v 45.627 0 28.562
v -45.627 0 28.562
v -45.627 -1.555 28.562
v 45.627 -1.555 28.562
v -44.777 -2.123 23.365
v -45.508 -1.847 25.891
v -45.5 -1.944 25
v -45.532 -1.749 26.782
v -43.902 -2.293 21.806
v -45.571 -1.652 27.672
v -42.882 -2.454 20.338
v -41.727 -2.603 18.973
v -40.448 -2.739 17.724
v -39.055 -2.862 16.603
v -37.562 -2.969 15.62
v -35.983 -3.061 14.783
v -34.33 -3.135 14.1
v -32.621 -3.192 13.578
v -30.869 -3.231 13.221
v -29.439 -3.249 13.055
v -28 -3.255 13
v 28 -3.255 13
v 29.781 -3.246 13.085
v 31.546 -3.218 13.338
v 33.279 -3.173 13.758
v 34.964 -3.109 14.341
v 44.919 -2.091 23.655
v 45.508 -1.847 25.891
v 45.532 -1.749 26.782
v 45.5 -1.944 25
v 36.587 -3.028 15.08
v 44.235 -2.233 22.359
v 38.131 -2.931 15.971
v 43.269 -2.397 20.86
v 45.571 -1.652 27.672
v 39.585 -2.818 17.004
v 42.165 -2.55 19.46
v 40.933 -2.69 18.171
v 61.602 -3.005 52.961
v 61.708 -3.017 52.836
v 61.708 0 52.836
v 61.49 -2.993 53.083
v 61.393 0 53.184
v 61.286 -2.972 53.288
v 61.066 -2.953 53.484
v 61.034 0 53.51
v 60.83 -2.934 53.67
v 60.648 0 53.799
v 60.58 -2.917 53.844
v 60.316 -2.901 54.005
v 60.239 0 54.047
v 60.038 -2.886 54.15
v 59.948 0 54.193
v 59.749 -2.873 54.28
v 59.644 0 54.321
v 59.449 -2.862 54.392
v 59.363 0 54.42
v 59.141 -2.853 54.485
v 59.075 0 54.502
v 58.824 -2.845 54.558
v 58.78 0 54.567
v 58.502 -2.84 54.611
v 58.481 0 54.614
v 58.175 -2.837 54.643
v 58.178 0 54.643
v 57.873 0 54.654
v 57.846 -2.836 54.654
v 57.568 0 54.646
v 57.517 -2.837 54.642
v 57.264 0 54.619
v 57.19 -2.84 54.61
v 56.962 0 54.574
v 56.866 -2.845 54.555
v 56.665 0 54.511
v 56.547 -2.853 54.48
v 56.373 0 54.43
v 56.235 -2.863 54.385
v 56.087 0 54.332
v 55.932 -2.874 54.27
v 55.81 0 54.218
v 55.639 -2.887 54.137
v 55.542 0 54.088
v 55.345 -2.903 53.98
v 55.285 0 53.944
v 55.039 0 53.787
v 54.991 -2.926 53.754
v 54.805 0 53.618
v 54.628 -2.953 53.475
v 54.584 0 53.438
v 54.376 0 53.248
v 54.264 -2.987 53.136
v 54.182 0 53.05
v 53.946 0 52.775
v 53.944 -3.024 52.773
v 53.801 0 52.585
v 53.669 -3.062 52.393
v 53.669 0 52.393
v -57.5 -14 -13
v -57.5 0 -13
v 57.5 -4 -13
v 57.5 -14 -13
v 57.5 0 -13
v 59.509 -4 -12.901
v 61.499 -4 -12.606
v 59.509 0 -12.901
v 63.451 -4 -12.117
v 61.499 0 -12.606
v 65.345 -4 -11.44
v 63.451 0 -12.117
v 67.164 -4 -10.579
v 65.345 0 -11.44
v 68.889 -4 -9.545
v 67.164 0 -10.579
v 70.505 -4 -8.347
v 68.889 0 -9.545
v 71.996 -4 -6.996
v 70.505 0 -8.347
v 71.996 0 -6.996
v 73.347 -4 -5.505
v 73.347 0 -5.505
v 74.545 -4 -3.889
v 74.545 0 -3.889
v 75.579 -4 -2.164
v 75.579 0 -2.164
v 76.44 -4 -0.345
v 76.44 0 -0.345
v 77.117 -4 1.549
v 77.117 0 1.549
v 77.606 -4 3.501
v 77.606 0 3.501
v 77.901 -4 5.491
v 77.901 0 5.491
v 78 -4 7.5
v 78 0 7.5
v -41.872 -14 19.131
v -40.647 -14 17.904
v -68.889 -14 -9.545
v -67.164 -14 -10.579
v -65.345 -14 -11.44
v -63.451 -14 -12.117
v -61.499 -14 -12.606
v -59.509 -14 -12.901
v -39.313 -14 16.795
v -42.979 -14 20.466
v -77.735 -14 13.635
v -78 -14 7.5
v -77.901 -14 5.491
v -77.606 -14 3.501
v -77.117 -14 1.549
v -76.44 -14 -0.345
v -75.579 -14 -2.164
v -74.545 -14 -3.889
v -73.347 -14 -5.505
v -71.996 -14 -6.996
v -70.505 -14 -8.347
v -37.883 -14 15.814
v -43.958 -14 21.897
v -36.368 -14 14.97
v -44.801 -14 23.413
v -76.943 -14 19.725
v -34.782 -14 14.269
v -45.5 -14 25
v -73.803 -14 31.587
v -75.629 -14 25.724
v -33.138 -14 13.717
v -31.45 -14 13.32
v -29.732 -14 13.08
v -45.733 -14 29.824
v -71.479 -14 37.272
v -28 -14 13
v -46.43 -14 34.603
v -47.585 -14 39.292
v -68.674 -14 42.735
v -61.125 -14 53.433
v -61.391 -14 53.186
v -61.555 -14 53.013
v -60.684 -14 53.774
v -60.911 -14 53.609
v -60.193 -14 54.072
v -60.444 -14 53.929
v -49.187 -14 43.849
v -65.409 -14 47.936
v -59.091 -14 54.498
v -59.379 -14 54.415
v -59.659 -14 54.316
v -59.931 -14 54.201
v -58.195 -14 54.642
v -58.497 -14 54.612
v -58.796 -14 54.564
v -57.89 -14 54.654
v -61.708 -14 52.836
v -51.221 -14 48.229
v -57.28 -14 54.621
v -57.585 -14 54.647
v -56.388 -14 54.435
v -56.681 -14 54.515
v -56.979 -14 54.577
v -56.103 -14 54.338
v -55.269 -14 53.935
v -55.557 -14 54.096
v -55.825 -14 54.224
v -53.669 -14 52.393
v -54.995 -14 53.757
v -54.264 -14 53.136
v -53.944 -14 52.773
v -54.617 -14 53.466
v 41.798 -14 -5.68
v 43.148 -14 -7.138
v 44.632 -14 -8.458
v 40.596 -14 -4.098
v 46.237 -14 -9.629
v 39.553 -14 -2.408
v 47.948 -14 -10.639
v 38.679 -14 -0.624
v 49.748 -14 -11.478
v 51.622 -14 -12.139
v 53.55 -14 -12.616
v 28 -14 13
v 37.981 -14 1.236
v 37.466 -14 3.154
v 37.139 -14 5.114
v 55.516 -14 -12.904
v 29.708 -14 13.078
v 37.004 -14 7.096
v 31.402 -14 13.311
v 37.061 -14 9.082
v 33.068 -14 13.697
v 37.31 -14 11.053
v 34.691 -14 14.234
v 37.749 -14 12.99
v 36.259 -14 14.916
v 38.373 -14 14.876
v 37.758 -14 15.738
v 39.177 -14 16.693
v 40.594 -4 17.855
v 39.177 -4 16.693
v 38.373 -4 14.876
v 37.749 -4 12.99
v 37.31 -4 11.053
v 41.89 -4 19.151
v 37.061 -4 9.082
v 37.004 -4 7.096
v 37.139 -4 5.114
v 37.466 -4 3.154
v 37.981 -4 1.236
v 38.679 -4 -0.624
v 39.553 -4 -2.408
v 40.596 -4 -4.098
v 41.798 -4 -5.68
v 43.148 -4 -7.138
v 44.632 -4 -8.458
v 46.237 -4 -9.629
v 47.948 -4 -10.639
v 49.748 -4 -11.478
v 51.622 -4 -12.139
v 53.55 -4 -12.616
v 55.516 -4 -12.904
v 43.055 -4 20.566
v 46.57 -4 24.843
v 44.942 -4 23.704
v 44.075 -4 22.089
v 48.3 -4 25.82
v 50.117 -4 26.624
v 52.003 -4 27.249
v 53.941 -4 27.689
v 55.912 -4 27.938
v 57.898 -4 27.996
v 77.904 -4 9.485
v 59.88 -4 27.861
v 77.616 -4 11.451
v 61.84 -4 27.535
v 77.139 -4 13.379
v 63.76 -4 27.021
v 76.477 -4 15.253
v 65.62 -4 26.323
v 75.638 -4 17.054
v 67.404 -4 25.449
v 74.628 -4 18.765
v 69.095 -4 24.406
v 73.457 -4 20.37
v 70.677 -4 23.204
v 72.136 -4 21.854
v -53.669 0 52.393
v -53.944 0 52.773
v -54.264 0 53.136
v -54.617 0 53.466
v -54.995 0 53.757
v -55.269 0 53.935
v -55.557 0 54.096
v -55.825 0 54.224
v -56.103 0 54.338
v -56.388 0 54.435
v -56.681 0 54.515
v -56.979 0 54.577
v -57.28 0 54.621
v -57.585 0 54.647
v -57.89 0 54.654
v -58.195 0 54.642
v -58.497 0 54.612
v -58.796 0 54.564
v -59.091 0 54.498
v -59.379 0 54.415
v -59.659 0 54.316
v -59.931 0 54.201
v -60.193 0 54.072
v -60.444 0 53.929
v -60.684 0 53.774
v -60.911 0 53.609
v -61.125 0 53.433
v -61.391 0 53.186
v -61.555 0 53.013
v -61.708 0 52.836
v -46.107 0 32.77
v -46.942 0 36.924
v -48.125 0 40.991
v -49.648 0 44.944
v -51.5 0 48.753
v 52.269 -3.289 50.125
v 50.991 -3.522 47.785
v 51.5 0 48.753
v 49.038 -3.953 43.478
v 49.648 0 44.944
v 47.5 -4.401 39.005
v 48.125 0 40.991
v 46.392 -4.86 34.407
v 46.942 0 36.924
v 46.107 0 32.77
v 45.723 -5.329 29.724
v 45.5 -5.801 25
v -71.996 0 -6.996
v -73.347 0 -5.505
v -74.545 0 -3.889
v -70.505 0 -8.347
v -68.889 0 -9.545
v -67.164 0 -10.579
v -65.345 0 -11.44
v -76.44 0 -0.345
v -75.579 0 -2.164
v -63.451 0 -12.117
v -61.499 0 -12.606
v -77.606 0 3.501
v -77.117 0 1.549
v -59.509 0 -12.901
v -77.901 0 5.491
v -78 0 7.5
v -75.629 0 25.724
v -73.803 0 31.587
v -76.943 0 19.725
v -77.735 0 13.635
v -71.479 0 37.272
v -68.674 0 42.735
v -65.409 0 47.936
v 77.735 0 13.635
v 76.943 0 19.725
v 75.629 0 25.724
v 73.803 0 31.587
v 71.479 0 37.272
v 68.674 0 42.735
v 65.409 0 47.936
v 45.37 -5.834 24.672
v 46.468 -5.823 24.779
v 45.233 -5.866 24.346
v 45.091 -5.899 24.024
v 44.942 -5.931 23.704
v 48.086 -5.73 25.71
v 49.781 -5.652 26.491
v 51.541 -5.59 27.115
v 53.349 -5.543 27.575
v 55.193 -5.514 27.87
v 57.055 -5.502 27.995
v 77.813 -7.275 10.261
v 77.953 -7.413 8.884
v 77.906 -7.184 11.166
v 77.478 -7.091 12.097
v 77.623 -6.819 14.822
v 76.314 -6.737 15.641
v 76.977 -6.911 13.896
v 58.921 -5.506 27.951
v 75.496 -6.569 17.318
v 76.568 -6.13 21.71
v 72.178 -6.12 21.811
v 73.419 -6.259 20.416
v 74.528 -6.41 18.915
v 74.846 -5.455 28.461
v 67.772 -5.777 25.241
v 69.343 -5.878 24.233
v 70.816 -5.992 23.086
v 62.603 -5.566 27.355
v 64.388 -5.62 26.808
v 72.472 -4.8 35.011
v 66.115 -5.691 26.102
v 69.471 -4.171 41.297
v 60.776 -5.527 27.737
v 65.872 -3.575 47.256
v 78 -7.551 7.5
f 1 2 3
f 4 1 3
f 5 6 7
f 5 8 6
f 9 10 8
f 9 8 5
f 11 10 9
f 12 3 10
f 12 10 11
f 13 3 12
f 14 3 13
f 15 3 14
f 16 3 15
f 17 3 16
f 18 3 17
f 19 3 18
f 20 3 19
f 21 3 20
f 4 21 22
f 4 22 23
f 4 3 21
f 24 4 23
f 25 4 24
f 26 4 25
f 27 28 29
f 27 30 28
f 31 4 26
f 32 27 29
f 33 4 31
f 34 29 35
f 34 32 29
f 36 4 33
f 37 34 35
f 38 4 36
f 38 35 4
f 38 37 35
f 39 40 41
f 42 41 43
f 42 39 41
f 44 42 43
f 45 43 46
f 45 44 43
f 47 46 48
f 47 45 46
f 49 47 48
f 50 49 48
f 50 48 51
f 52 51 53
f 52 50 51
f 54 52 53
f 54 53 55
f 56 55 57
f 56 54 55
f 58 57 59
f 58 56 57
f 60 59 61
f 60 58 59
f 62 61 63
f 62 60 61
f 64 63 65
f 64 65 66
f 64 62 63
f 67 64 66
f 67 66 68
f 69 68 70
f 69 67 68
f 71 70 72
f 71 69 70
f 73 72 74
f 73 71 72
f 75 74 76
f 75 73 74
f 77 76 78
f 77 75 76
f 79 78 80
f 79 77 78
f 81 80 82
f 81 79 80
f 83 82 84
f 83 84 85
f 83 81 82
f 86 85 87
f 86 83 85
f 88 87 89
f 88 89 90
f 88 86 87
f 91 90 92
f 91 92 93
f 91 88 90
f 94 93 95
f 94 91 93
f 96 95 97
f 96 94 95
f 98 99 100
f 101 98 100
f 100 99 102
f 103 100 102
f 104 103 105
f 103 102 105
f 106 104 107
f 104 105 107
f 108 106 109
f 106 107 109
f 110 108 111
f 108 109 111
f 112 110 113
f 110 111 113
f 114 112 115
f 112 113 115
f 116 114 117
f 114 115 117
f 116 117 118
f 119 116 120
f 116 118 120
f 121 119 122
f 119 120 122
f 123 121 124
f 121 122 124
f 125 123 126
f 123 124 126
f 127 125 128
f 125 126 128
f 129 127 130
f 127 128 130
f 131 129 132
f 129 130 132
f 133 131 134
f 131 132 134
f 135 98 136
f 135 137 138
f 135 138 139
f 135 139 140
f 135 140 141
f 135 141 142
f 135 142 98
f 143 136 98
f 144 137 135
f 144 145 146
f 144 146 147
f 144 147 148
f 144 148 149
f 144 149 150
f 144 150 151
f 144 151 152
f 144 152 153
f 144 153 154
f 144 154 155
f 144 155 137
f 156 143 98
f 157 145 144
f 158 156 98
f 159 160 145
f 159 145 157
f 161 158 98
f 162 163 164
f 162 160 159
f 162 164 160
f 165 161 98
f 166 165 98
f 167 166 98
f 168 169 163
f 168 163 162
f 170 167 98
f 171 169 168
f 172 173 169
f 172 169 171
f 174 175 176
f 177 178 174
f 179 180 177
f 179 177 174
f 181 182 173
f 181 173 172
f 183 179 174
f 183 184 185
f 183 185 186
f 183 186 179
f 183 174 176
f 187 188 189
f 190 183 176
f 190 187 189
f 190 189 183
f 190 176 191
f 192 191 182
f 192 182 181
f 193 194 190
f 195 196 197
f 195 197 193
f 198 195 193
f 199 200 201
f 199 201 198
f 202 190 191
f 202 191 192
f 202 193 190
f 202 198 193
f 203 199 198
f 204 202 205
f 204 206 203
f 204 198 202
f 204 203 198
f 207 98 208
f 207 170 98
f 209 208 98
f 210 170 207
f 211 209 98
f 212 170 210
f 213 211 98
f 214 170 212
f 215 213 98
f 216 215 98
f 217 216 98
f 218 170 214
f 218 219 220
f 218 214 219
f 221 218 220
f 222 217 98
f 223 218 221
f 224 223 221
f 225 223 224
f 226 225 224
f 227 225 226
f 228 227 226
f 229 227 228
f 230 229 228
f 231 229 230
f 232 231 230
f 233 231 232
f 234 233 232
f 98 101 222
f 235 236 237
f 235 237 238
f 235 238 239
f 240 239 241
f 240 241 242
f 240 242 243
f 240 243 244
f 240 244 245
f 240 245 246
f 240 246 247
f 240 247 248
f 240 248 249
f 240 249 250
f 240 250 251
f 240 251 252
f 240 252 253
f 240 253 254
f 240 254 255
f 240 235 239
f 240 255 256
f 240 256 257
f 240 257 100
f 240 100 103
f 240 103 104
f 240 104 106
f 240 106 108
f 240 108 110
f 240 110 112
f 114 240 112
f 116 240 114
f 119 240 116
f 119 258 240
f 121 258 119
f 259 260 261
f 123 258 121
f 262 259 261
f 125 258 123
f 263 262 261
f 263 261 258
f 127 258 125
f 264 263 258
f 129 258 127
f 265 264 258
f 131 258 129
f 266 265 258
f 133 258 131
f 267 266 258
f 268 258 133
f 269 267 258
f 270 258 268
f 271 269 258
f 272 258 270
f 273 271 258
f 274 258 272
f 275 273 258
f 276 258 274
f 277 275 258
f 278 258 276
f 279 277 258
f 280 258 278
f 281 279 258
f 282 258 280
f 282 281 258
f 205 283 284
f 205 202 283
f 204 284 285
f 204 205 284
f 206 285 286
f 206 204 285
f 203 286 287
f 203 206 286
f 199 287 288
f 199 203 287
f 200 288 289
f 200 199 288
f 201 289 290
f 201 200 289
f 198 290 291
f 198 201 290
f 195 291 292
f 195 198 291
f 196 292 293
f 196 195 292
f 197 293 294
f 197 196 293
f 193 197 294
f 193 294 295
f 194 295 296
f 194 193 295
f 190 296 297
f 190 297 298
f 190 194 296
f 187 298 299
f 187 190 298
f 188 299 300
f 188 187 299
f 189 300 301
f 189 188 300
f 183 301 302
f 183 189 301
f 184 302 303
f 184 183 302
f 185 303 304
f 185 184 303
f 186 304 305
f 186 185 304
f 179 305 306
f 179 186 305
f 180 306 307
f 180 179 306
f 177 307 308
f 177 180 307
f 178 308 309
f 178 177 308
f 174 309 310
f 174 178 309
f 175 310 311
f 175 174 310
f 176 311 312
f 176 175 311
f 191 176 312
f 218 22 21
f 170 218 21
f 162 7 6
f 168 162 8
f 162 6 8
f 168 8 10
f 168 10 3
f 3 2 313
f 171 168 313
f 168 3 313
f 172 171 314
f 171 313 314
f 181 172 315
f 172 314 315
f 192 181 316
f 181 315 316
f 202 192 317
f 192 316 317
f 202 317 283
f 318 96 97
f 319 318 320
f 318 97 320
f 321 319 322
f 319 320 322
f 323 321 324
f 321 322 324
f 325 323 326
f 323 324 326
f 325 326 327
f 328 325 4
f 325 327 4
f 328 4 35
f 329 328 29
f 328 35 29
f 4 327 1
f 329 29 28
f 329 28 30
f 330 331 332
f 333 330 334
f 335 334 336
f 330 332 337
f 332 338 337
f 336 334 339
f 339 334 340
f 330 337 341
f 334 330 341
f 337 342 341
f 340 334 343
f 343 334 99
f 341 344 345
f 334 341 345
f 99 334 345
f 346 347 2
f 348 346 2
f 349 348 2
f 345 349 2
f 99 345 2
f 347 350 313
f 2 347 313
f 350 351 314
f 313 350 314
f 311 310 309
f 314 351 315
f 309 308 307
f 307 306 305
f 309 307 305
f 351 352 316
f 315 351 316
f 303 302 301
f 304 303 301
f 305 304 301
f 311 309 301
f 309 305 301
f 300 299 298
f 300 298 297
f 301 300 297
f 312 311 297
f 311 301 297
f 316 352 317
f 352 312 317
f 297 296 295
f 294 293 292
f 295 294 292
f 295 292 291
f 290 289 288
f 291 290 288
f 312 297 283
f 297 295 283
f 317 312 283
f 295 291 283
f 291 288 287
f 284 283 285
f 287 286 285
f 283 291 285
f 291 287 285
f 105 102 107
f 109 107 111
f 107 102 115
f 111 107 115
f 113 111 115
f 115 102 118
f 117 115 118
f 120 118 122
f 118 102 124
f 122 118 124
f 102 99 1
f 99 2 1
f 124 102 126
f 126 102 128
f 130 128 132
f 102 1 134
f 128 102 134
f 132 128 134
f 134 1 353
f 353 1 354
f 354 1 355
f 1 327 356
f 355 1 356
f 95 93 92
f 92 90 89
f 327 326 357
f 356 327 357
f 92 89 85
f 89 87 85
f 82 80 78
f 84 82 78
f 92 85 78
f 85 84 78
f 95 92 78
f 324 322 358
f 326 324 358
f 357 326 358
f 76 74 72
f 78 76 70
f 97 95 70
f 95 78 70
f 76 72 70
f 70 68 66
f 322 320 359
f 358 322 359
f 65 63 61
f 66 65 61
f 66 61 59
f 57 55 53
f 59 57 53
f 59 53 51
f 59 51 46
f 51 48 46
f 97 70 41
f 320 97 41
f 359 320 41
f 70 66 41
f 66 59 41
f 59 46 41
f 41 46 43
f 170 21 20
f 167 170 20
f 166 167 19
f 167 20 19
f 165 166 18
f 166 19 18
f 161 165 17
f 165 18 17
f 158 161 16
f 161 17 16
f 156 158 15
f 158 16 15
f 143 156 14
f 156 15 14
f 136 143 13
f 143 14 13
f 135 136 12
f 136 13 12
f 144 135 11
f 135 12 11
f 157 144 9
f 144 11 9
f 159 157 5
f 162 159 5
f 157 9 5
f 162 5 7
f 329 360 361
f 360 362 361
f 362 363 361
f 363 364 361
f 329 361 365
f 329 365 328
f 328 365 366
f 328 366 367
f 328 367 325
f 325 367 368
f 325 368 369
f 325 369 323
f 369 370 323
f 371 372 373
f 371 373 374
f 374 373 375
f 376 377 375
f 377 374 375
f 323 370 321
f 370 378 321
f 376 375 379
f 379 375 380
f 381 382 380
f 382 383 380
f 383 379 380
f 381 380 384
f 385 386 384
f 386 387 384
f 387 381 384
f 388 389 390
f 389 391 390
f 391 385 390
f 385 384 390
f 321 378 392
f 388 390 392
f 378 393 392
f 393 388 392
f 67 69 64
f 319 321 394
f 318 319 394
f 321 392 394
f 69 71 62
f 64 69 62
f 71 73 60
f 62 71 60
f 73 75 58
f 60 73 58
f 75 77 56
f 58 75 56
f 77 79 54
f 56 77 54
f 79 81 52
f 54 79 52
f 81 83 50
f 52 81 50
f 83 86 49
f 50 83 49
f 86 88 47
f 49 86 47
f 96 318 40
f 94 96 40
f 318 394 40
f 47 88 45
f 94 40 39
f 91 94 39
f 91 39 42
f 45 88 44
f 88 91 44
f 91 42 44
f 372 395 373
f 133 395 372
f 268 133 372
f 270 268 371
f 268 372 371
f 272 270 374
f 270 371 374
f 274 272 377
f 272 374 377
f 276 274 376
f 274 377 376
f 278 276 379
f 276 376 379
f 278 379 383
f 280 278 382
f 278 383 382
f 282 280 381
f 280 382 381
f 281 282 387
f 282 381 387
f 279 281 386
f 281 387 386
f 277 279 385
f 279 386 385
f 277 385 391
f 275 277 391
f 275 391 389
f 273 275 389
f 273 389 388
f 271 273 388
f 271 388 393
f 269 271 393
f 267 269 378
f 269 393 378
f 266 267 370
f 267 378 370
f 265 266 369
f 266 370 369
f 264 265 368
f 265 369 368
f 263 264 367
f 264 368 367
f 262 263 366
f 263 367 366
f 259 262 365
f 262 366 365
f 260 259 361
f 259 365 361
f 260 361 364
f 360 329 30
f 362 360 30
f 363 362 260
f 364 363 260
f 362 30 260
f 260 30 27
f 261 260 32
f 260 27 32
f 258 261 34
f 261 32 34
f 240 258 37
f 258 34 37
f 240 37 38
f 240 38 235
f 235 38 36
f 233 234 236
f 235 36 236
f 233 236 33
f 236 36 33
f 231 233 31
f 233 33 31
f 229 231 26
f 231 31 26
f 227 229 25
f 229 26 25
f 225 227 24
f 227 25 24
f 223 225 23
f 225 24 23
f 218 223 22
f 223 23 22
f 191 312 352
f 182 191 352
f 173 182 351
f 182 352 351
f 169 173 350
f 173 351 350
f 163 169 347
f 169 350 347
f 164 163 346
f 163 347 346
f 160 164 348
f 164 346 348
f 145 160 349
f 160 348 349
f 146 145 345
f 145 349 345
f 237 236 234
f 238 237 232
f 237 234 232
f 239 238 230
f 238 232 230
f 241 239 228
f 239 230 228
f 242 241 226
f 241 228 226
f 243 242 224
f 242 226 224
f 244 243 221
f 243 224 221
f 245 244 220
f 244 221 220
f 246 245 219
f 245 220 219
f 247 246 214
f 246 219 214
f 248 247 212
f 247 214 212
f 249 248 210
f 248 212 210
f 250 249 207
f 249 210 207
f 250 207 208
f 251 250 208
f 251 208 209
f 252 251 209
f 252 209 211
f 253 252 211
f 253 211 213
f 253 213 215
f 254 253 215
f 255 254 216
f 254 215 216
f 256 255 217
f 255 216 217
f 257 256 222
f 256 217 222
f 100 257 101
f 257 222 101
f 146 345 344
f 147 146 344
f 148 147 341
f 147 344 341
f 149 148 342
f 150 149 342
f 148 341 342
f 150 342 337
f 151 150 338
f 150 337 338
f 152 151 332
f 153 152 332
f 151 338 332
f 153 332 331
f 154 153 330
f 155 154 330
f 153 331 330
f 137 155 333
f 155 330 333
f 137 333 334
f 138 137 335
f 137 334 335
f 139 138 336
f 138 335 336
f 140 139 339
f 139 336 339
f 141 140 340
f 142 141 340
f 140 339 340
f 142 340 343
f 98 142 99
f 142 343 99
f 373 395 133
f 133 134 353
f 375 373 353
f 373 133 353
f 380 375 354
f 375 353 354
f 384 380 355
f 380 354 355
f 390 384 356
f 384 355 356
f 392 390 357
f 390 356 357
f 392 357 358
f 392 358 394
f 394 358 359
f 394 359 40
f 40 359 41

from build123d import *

# Parameters (mm, degrees)
F1_DEPTH  = 14
F2_R      = 5
F3_R      = 20.5
F4_DEPTH  = 10
F7_DEPTH  = 35.5
F10_DEPTH = 106.1


with BuildPart() as f1:
    # F0 (on Front) → F1 (new body)
    with BuildSketch(Plane.XZ):
        with BuildLine():
            ThreePointArc((45.5, 24.999816), (38.609496, 16.288102), (28, 13))
            Line((28, 13), (-28, 13))
            ThreePointArc((-28, 13), (-38.609496, 16.288102), (-45.5, 24.999816))
            ThreePointArc((-45.5, 24.999816), (-48.595144, 42.322464), (-57.5, 57.5))
            ThreePointArc((-57.5, 57.5), (-72.676021, 34.519669), (-78, 7.5))
            ThreePointArc((-78, 7.5), (-71.995689, -6.995689), (-57.5, -13))
            Line((-57.5, -13), (-28, -13))
            Line((-28, -13), (28, -13))
            Line((28, -13), (57.5, -13))
            ThreePointArc((57.5, -13), (71.995689, -6.995689), (78, 7.5))
            ThreePointArc((78, 7.5), (72.676021, 34.519669), (57.5, 57.5))
            ThreePointArc((57.5, 57.5), (48.595144, 42.322464), (45.5, 24.999816))
        make_face()
    extrude(amount=F1_DEPTH)

    # F2
    f2_edges = [f1.edges().sort_by_distance(p)[0] for p in [
        (57.5, -7, 57.5),
        (-57.5, -7, 57.5),
    ]]
    fillet(f2_edges, radius=F2_R)

    # F3 (on face) → F4 (cut)
    with BuildSketch(Plane.XZ.offset(14)):
        with Locations((57.5, 7.5)):
            Circle(F3_R)
    extrude(amount=-F4_DEPTH, mode=Mode.SUBTRACT)

    # F6 (on offset) → F7 (cut)
    with BuildSketch(Plane.YZ.offset(78.5)):
        Polygon((-16.908804, 57.223689), (-16.908804, 6.107894), (-7.749326, 5.516961), (-2.578652, 57.223689), align=None)
    extrude(amount=-F7_DEPTH, mode=Mode.SUBTRACT)

    # F9 (on offset) → F10 (join)
    with BuildSketch(Plane.YZ.offset(57)):
        Polygon((0, 0), (0, 6.538654), (0, 28.561684), (-1.554986, 28.561684), (-3.524526, 10.537416), (-3.524526, 0), align=None)
    extrude(amount=-F10_DEPTH)


solid = f1.part
